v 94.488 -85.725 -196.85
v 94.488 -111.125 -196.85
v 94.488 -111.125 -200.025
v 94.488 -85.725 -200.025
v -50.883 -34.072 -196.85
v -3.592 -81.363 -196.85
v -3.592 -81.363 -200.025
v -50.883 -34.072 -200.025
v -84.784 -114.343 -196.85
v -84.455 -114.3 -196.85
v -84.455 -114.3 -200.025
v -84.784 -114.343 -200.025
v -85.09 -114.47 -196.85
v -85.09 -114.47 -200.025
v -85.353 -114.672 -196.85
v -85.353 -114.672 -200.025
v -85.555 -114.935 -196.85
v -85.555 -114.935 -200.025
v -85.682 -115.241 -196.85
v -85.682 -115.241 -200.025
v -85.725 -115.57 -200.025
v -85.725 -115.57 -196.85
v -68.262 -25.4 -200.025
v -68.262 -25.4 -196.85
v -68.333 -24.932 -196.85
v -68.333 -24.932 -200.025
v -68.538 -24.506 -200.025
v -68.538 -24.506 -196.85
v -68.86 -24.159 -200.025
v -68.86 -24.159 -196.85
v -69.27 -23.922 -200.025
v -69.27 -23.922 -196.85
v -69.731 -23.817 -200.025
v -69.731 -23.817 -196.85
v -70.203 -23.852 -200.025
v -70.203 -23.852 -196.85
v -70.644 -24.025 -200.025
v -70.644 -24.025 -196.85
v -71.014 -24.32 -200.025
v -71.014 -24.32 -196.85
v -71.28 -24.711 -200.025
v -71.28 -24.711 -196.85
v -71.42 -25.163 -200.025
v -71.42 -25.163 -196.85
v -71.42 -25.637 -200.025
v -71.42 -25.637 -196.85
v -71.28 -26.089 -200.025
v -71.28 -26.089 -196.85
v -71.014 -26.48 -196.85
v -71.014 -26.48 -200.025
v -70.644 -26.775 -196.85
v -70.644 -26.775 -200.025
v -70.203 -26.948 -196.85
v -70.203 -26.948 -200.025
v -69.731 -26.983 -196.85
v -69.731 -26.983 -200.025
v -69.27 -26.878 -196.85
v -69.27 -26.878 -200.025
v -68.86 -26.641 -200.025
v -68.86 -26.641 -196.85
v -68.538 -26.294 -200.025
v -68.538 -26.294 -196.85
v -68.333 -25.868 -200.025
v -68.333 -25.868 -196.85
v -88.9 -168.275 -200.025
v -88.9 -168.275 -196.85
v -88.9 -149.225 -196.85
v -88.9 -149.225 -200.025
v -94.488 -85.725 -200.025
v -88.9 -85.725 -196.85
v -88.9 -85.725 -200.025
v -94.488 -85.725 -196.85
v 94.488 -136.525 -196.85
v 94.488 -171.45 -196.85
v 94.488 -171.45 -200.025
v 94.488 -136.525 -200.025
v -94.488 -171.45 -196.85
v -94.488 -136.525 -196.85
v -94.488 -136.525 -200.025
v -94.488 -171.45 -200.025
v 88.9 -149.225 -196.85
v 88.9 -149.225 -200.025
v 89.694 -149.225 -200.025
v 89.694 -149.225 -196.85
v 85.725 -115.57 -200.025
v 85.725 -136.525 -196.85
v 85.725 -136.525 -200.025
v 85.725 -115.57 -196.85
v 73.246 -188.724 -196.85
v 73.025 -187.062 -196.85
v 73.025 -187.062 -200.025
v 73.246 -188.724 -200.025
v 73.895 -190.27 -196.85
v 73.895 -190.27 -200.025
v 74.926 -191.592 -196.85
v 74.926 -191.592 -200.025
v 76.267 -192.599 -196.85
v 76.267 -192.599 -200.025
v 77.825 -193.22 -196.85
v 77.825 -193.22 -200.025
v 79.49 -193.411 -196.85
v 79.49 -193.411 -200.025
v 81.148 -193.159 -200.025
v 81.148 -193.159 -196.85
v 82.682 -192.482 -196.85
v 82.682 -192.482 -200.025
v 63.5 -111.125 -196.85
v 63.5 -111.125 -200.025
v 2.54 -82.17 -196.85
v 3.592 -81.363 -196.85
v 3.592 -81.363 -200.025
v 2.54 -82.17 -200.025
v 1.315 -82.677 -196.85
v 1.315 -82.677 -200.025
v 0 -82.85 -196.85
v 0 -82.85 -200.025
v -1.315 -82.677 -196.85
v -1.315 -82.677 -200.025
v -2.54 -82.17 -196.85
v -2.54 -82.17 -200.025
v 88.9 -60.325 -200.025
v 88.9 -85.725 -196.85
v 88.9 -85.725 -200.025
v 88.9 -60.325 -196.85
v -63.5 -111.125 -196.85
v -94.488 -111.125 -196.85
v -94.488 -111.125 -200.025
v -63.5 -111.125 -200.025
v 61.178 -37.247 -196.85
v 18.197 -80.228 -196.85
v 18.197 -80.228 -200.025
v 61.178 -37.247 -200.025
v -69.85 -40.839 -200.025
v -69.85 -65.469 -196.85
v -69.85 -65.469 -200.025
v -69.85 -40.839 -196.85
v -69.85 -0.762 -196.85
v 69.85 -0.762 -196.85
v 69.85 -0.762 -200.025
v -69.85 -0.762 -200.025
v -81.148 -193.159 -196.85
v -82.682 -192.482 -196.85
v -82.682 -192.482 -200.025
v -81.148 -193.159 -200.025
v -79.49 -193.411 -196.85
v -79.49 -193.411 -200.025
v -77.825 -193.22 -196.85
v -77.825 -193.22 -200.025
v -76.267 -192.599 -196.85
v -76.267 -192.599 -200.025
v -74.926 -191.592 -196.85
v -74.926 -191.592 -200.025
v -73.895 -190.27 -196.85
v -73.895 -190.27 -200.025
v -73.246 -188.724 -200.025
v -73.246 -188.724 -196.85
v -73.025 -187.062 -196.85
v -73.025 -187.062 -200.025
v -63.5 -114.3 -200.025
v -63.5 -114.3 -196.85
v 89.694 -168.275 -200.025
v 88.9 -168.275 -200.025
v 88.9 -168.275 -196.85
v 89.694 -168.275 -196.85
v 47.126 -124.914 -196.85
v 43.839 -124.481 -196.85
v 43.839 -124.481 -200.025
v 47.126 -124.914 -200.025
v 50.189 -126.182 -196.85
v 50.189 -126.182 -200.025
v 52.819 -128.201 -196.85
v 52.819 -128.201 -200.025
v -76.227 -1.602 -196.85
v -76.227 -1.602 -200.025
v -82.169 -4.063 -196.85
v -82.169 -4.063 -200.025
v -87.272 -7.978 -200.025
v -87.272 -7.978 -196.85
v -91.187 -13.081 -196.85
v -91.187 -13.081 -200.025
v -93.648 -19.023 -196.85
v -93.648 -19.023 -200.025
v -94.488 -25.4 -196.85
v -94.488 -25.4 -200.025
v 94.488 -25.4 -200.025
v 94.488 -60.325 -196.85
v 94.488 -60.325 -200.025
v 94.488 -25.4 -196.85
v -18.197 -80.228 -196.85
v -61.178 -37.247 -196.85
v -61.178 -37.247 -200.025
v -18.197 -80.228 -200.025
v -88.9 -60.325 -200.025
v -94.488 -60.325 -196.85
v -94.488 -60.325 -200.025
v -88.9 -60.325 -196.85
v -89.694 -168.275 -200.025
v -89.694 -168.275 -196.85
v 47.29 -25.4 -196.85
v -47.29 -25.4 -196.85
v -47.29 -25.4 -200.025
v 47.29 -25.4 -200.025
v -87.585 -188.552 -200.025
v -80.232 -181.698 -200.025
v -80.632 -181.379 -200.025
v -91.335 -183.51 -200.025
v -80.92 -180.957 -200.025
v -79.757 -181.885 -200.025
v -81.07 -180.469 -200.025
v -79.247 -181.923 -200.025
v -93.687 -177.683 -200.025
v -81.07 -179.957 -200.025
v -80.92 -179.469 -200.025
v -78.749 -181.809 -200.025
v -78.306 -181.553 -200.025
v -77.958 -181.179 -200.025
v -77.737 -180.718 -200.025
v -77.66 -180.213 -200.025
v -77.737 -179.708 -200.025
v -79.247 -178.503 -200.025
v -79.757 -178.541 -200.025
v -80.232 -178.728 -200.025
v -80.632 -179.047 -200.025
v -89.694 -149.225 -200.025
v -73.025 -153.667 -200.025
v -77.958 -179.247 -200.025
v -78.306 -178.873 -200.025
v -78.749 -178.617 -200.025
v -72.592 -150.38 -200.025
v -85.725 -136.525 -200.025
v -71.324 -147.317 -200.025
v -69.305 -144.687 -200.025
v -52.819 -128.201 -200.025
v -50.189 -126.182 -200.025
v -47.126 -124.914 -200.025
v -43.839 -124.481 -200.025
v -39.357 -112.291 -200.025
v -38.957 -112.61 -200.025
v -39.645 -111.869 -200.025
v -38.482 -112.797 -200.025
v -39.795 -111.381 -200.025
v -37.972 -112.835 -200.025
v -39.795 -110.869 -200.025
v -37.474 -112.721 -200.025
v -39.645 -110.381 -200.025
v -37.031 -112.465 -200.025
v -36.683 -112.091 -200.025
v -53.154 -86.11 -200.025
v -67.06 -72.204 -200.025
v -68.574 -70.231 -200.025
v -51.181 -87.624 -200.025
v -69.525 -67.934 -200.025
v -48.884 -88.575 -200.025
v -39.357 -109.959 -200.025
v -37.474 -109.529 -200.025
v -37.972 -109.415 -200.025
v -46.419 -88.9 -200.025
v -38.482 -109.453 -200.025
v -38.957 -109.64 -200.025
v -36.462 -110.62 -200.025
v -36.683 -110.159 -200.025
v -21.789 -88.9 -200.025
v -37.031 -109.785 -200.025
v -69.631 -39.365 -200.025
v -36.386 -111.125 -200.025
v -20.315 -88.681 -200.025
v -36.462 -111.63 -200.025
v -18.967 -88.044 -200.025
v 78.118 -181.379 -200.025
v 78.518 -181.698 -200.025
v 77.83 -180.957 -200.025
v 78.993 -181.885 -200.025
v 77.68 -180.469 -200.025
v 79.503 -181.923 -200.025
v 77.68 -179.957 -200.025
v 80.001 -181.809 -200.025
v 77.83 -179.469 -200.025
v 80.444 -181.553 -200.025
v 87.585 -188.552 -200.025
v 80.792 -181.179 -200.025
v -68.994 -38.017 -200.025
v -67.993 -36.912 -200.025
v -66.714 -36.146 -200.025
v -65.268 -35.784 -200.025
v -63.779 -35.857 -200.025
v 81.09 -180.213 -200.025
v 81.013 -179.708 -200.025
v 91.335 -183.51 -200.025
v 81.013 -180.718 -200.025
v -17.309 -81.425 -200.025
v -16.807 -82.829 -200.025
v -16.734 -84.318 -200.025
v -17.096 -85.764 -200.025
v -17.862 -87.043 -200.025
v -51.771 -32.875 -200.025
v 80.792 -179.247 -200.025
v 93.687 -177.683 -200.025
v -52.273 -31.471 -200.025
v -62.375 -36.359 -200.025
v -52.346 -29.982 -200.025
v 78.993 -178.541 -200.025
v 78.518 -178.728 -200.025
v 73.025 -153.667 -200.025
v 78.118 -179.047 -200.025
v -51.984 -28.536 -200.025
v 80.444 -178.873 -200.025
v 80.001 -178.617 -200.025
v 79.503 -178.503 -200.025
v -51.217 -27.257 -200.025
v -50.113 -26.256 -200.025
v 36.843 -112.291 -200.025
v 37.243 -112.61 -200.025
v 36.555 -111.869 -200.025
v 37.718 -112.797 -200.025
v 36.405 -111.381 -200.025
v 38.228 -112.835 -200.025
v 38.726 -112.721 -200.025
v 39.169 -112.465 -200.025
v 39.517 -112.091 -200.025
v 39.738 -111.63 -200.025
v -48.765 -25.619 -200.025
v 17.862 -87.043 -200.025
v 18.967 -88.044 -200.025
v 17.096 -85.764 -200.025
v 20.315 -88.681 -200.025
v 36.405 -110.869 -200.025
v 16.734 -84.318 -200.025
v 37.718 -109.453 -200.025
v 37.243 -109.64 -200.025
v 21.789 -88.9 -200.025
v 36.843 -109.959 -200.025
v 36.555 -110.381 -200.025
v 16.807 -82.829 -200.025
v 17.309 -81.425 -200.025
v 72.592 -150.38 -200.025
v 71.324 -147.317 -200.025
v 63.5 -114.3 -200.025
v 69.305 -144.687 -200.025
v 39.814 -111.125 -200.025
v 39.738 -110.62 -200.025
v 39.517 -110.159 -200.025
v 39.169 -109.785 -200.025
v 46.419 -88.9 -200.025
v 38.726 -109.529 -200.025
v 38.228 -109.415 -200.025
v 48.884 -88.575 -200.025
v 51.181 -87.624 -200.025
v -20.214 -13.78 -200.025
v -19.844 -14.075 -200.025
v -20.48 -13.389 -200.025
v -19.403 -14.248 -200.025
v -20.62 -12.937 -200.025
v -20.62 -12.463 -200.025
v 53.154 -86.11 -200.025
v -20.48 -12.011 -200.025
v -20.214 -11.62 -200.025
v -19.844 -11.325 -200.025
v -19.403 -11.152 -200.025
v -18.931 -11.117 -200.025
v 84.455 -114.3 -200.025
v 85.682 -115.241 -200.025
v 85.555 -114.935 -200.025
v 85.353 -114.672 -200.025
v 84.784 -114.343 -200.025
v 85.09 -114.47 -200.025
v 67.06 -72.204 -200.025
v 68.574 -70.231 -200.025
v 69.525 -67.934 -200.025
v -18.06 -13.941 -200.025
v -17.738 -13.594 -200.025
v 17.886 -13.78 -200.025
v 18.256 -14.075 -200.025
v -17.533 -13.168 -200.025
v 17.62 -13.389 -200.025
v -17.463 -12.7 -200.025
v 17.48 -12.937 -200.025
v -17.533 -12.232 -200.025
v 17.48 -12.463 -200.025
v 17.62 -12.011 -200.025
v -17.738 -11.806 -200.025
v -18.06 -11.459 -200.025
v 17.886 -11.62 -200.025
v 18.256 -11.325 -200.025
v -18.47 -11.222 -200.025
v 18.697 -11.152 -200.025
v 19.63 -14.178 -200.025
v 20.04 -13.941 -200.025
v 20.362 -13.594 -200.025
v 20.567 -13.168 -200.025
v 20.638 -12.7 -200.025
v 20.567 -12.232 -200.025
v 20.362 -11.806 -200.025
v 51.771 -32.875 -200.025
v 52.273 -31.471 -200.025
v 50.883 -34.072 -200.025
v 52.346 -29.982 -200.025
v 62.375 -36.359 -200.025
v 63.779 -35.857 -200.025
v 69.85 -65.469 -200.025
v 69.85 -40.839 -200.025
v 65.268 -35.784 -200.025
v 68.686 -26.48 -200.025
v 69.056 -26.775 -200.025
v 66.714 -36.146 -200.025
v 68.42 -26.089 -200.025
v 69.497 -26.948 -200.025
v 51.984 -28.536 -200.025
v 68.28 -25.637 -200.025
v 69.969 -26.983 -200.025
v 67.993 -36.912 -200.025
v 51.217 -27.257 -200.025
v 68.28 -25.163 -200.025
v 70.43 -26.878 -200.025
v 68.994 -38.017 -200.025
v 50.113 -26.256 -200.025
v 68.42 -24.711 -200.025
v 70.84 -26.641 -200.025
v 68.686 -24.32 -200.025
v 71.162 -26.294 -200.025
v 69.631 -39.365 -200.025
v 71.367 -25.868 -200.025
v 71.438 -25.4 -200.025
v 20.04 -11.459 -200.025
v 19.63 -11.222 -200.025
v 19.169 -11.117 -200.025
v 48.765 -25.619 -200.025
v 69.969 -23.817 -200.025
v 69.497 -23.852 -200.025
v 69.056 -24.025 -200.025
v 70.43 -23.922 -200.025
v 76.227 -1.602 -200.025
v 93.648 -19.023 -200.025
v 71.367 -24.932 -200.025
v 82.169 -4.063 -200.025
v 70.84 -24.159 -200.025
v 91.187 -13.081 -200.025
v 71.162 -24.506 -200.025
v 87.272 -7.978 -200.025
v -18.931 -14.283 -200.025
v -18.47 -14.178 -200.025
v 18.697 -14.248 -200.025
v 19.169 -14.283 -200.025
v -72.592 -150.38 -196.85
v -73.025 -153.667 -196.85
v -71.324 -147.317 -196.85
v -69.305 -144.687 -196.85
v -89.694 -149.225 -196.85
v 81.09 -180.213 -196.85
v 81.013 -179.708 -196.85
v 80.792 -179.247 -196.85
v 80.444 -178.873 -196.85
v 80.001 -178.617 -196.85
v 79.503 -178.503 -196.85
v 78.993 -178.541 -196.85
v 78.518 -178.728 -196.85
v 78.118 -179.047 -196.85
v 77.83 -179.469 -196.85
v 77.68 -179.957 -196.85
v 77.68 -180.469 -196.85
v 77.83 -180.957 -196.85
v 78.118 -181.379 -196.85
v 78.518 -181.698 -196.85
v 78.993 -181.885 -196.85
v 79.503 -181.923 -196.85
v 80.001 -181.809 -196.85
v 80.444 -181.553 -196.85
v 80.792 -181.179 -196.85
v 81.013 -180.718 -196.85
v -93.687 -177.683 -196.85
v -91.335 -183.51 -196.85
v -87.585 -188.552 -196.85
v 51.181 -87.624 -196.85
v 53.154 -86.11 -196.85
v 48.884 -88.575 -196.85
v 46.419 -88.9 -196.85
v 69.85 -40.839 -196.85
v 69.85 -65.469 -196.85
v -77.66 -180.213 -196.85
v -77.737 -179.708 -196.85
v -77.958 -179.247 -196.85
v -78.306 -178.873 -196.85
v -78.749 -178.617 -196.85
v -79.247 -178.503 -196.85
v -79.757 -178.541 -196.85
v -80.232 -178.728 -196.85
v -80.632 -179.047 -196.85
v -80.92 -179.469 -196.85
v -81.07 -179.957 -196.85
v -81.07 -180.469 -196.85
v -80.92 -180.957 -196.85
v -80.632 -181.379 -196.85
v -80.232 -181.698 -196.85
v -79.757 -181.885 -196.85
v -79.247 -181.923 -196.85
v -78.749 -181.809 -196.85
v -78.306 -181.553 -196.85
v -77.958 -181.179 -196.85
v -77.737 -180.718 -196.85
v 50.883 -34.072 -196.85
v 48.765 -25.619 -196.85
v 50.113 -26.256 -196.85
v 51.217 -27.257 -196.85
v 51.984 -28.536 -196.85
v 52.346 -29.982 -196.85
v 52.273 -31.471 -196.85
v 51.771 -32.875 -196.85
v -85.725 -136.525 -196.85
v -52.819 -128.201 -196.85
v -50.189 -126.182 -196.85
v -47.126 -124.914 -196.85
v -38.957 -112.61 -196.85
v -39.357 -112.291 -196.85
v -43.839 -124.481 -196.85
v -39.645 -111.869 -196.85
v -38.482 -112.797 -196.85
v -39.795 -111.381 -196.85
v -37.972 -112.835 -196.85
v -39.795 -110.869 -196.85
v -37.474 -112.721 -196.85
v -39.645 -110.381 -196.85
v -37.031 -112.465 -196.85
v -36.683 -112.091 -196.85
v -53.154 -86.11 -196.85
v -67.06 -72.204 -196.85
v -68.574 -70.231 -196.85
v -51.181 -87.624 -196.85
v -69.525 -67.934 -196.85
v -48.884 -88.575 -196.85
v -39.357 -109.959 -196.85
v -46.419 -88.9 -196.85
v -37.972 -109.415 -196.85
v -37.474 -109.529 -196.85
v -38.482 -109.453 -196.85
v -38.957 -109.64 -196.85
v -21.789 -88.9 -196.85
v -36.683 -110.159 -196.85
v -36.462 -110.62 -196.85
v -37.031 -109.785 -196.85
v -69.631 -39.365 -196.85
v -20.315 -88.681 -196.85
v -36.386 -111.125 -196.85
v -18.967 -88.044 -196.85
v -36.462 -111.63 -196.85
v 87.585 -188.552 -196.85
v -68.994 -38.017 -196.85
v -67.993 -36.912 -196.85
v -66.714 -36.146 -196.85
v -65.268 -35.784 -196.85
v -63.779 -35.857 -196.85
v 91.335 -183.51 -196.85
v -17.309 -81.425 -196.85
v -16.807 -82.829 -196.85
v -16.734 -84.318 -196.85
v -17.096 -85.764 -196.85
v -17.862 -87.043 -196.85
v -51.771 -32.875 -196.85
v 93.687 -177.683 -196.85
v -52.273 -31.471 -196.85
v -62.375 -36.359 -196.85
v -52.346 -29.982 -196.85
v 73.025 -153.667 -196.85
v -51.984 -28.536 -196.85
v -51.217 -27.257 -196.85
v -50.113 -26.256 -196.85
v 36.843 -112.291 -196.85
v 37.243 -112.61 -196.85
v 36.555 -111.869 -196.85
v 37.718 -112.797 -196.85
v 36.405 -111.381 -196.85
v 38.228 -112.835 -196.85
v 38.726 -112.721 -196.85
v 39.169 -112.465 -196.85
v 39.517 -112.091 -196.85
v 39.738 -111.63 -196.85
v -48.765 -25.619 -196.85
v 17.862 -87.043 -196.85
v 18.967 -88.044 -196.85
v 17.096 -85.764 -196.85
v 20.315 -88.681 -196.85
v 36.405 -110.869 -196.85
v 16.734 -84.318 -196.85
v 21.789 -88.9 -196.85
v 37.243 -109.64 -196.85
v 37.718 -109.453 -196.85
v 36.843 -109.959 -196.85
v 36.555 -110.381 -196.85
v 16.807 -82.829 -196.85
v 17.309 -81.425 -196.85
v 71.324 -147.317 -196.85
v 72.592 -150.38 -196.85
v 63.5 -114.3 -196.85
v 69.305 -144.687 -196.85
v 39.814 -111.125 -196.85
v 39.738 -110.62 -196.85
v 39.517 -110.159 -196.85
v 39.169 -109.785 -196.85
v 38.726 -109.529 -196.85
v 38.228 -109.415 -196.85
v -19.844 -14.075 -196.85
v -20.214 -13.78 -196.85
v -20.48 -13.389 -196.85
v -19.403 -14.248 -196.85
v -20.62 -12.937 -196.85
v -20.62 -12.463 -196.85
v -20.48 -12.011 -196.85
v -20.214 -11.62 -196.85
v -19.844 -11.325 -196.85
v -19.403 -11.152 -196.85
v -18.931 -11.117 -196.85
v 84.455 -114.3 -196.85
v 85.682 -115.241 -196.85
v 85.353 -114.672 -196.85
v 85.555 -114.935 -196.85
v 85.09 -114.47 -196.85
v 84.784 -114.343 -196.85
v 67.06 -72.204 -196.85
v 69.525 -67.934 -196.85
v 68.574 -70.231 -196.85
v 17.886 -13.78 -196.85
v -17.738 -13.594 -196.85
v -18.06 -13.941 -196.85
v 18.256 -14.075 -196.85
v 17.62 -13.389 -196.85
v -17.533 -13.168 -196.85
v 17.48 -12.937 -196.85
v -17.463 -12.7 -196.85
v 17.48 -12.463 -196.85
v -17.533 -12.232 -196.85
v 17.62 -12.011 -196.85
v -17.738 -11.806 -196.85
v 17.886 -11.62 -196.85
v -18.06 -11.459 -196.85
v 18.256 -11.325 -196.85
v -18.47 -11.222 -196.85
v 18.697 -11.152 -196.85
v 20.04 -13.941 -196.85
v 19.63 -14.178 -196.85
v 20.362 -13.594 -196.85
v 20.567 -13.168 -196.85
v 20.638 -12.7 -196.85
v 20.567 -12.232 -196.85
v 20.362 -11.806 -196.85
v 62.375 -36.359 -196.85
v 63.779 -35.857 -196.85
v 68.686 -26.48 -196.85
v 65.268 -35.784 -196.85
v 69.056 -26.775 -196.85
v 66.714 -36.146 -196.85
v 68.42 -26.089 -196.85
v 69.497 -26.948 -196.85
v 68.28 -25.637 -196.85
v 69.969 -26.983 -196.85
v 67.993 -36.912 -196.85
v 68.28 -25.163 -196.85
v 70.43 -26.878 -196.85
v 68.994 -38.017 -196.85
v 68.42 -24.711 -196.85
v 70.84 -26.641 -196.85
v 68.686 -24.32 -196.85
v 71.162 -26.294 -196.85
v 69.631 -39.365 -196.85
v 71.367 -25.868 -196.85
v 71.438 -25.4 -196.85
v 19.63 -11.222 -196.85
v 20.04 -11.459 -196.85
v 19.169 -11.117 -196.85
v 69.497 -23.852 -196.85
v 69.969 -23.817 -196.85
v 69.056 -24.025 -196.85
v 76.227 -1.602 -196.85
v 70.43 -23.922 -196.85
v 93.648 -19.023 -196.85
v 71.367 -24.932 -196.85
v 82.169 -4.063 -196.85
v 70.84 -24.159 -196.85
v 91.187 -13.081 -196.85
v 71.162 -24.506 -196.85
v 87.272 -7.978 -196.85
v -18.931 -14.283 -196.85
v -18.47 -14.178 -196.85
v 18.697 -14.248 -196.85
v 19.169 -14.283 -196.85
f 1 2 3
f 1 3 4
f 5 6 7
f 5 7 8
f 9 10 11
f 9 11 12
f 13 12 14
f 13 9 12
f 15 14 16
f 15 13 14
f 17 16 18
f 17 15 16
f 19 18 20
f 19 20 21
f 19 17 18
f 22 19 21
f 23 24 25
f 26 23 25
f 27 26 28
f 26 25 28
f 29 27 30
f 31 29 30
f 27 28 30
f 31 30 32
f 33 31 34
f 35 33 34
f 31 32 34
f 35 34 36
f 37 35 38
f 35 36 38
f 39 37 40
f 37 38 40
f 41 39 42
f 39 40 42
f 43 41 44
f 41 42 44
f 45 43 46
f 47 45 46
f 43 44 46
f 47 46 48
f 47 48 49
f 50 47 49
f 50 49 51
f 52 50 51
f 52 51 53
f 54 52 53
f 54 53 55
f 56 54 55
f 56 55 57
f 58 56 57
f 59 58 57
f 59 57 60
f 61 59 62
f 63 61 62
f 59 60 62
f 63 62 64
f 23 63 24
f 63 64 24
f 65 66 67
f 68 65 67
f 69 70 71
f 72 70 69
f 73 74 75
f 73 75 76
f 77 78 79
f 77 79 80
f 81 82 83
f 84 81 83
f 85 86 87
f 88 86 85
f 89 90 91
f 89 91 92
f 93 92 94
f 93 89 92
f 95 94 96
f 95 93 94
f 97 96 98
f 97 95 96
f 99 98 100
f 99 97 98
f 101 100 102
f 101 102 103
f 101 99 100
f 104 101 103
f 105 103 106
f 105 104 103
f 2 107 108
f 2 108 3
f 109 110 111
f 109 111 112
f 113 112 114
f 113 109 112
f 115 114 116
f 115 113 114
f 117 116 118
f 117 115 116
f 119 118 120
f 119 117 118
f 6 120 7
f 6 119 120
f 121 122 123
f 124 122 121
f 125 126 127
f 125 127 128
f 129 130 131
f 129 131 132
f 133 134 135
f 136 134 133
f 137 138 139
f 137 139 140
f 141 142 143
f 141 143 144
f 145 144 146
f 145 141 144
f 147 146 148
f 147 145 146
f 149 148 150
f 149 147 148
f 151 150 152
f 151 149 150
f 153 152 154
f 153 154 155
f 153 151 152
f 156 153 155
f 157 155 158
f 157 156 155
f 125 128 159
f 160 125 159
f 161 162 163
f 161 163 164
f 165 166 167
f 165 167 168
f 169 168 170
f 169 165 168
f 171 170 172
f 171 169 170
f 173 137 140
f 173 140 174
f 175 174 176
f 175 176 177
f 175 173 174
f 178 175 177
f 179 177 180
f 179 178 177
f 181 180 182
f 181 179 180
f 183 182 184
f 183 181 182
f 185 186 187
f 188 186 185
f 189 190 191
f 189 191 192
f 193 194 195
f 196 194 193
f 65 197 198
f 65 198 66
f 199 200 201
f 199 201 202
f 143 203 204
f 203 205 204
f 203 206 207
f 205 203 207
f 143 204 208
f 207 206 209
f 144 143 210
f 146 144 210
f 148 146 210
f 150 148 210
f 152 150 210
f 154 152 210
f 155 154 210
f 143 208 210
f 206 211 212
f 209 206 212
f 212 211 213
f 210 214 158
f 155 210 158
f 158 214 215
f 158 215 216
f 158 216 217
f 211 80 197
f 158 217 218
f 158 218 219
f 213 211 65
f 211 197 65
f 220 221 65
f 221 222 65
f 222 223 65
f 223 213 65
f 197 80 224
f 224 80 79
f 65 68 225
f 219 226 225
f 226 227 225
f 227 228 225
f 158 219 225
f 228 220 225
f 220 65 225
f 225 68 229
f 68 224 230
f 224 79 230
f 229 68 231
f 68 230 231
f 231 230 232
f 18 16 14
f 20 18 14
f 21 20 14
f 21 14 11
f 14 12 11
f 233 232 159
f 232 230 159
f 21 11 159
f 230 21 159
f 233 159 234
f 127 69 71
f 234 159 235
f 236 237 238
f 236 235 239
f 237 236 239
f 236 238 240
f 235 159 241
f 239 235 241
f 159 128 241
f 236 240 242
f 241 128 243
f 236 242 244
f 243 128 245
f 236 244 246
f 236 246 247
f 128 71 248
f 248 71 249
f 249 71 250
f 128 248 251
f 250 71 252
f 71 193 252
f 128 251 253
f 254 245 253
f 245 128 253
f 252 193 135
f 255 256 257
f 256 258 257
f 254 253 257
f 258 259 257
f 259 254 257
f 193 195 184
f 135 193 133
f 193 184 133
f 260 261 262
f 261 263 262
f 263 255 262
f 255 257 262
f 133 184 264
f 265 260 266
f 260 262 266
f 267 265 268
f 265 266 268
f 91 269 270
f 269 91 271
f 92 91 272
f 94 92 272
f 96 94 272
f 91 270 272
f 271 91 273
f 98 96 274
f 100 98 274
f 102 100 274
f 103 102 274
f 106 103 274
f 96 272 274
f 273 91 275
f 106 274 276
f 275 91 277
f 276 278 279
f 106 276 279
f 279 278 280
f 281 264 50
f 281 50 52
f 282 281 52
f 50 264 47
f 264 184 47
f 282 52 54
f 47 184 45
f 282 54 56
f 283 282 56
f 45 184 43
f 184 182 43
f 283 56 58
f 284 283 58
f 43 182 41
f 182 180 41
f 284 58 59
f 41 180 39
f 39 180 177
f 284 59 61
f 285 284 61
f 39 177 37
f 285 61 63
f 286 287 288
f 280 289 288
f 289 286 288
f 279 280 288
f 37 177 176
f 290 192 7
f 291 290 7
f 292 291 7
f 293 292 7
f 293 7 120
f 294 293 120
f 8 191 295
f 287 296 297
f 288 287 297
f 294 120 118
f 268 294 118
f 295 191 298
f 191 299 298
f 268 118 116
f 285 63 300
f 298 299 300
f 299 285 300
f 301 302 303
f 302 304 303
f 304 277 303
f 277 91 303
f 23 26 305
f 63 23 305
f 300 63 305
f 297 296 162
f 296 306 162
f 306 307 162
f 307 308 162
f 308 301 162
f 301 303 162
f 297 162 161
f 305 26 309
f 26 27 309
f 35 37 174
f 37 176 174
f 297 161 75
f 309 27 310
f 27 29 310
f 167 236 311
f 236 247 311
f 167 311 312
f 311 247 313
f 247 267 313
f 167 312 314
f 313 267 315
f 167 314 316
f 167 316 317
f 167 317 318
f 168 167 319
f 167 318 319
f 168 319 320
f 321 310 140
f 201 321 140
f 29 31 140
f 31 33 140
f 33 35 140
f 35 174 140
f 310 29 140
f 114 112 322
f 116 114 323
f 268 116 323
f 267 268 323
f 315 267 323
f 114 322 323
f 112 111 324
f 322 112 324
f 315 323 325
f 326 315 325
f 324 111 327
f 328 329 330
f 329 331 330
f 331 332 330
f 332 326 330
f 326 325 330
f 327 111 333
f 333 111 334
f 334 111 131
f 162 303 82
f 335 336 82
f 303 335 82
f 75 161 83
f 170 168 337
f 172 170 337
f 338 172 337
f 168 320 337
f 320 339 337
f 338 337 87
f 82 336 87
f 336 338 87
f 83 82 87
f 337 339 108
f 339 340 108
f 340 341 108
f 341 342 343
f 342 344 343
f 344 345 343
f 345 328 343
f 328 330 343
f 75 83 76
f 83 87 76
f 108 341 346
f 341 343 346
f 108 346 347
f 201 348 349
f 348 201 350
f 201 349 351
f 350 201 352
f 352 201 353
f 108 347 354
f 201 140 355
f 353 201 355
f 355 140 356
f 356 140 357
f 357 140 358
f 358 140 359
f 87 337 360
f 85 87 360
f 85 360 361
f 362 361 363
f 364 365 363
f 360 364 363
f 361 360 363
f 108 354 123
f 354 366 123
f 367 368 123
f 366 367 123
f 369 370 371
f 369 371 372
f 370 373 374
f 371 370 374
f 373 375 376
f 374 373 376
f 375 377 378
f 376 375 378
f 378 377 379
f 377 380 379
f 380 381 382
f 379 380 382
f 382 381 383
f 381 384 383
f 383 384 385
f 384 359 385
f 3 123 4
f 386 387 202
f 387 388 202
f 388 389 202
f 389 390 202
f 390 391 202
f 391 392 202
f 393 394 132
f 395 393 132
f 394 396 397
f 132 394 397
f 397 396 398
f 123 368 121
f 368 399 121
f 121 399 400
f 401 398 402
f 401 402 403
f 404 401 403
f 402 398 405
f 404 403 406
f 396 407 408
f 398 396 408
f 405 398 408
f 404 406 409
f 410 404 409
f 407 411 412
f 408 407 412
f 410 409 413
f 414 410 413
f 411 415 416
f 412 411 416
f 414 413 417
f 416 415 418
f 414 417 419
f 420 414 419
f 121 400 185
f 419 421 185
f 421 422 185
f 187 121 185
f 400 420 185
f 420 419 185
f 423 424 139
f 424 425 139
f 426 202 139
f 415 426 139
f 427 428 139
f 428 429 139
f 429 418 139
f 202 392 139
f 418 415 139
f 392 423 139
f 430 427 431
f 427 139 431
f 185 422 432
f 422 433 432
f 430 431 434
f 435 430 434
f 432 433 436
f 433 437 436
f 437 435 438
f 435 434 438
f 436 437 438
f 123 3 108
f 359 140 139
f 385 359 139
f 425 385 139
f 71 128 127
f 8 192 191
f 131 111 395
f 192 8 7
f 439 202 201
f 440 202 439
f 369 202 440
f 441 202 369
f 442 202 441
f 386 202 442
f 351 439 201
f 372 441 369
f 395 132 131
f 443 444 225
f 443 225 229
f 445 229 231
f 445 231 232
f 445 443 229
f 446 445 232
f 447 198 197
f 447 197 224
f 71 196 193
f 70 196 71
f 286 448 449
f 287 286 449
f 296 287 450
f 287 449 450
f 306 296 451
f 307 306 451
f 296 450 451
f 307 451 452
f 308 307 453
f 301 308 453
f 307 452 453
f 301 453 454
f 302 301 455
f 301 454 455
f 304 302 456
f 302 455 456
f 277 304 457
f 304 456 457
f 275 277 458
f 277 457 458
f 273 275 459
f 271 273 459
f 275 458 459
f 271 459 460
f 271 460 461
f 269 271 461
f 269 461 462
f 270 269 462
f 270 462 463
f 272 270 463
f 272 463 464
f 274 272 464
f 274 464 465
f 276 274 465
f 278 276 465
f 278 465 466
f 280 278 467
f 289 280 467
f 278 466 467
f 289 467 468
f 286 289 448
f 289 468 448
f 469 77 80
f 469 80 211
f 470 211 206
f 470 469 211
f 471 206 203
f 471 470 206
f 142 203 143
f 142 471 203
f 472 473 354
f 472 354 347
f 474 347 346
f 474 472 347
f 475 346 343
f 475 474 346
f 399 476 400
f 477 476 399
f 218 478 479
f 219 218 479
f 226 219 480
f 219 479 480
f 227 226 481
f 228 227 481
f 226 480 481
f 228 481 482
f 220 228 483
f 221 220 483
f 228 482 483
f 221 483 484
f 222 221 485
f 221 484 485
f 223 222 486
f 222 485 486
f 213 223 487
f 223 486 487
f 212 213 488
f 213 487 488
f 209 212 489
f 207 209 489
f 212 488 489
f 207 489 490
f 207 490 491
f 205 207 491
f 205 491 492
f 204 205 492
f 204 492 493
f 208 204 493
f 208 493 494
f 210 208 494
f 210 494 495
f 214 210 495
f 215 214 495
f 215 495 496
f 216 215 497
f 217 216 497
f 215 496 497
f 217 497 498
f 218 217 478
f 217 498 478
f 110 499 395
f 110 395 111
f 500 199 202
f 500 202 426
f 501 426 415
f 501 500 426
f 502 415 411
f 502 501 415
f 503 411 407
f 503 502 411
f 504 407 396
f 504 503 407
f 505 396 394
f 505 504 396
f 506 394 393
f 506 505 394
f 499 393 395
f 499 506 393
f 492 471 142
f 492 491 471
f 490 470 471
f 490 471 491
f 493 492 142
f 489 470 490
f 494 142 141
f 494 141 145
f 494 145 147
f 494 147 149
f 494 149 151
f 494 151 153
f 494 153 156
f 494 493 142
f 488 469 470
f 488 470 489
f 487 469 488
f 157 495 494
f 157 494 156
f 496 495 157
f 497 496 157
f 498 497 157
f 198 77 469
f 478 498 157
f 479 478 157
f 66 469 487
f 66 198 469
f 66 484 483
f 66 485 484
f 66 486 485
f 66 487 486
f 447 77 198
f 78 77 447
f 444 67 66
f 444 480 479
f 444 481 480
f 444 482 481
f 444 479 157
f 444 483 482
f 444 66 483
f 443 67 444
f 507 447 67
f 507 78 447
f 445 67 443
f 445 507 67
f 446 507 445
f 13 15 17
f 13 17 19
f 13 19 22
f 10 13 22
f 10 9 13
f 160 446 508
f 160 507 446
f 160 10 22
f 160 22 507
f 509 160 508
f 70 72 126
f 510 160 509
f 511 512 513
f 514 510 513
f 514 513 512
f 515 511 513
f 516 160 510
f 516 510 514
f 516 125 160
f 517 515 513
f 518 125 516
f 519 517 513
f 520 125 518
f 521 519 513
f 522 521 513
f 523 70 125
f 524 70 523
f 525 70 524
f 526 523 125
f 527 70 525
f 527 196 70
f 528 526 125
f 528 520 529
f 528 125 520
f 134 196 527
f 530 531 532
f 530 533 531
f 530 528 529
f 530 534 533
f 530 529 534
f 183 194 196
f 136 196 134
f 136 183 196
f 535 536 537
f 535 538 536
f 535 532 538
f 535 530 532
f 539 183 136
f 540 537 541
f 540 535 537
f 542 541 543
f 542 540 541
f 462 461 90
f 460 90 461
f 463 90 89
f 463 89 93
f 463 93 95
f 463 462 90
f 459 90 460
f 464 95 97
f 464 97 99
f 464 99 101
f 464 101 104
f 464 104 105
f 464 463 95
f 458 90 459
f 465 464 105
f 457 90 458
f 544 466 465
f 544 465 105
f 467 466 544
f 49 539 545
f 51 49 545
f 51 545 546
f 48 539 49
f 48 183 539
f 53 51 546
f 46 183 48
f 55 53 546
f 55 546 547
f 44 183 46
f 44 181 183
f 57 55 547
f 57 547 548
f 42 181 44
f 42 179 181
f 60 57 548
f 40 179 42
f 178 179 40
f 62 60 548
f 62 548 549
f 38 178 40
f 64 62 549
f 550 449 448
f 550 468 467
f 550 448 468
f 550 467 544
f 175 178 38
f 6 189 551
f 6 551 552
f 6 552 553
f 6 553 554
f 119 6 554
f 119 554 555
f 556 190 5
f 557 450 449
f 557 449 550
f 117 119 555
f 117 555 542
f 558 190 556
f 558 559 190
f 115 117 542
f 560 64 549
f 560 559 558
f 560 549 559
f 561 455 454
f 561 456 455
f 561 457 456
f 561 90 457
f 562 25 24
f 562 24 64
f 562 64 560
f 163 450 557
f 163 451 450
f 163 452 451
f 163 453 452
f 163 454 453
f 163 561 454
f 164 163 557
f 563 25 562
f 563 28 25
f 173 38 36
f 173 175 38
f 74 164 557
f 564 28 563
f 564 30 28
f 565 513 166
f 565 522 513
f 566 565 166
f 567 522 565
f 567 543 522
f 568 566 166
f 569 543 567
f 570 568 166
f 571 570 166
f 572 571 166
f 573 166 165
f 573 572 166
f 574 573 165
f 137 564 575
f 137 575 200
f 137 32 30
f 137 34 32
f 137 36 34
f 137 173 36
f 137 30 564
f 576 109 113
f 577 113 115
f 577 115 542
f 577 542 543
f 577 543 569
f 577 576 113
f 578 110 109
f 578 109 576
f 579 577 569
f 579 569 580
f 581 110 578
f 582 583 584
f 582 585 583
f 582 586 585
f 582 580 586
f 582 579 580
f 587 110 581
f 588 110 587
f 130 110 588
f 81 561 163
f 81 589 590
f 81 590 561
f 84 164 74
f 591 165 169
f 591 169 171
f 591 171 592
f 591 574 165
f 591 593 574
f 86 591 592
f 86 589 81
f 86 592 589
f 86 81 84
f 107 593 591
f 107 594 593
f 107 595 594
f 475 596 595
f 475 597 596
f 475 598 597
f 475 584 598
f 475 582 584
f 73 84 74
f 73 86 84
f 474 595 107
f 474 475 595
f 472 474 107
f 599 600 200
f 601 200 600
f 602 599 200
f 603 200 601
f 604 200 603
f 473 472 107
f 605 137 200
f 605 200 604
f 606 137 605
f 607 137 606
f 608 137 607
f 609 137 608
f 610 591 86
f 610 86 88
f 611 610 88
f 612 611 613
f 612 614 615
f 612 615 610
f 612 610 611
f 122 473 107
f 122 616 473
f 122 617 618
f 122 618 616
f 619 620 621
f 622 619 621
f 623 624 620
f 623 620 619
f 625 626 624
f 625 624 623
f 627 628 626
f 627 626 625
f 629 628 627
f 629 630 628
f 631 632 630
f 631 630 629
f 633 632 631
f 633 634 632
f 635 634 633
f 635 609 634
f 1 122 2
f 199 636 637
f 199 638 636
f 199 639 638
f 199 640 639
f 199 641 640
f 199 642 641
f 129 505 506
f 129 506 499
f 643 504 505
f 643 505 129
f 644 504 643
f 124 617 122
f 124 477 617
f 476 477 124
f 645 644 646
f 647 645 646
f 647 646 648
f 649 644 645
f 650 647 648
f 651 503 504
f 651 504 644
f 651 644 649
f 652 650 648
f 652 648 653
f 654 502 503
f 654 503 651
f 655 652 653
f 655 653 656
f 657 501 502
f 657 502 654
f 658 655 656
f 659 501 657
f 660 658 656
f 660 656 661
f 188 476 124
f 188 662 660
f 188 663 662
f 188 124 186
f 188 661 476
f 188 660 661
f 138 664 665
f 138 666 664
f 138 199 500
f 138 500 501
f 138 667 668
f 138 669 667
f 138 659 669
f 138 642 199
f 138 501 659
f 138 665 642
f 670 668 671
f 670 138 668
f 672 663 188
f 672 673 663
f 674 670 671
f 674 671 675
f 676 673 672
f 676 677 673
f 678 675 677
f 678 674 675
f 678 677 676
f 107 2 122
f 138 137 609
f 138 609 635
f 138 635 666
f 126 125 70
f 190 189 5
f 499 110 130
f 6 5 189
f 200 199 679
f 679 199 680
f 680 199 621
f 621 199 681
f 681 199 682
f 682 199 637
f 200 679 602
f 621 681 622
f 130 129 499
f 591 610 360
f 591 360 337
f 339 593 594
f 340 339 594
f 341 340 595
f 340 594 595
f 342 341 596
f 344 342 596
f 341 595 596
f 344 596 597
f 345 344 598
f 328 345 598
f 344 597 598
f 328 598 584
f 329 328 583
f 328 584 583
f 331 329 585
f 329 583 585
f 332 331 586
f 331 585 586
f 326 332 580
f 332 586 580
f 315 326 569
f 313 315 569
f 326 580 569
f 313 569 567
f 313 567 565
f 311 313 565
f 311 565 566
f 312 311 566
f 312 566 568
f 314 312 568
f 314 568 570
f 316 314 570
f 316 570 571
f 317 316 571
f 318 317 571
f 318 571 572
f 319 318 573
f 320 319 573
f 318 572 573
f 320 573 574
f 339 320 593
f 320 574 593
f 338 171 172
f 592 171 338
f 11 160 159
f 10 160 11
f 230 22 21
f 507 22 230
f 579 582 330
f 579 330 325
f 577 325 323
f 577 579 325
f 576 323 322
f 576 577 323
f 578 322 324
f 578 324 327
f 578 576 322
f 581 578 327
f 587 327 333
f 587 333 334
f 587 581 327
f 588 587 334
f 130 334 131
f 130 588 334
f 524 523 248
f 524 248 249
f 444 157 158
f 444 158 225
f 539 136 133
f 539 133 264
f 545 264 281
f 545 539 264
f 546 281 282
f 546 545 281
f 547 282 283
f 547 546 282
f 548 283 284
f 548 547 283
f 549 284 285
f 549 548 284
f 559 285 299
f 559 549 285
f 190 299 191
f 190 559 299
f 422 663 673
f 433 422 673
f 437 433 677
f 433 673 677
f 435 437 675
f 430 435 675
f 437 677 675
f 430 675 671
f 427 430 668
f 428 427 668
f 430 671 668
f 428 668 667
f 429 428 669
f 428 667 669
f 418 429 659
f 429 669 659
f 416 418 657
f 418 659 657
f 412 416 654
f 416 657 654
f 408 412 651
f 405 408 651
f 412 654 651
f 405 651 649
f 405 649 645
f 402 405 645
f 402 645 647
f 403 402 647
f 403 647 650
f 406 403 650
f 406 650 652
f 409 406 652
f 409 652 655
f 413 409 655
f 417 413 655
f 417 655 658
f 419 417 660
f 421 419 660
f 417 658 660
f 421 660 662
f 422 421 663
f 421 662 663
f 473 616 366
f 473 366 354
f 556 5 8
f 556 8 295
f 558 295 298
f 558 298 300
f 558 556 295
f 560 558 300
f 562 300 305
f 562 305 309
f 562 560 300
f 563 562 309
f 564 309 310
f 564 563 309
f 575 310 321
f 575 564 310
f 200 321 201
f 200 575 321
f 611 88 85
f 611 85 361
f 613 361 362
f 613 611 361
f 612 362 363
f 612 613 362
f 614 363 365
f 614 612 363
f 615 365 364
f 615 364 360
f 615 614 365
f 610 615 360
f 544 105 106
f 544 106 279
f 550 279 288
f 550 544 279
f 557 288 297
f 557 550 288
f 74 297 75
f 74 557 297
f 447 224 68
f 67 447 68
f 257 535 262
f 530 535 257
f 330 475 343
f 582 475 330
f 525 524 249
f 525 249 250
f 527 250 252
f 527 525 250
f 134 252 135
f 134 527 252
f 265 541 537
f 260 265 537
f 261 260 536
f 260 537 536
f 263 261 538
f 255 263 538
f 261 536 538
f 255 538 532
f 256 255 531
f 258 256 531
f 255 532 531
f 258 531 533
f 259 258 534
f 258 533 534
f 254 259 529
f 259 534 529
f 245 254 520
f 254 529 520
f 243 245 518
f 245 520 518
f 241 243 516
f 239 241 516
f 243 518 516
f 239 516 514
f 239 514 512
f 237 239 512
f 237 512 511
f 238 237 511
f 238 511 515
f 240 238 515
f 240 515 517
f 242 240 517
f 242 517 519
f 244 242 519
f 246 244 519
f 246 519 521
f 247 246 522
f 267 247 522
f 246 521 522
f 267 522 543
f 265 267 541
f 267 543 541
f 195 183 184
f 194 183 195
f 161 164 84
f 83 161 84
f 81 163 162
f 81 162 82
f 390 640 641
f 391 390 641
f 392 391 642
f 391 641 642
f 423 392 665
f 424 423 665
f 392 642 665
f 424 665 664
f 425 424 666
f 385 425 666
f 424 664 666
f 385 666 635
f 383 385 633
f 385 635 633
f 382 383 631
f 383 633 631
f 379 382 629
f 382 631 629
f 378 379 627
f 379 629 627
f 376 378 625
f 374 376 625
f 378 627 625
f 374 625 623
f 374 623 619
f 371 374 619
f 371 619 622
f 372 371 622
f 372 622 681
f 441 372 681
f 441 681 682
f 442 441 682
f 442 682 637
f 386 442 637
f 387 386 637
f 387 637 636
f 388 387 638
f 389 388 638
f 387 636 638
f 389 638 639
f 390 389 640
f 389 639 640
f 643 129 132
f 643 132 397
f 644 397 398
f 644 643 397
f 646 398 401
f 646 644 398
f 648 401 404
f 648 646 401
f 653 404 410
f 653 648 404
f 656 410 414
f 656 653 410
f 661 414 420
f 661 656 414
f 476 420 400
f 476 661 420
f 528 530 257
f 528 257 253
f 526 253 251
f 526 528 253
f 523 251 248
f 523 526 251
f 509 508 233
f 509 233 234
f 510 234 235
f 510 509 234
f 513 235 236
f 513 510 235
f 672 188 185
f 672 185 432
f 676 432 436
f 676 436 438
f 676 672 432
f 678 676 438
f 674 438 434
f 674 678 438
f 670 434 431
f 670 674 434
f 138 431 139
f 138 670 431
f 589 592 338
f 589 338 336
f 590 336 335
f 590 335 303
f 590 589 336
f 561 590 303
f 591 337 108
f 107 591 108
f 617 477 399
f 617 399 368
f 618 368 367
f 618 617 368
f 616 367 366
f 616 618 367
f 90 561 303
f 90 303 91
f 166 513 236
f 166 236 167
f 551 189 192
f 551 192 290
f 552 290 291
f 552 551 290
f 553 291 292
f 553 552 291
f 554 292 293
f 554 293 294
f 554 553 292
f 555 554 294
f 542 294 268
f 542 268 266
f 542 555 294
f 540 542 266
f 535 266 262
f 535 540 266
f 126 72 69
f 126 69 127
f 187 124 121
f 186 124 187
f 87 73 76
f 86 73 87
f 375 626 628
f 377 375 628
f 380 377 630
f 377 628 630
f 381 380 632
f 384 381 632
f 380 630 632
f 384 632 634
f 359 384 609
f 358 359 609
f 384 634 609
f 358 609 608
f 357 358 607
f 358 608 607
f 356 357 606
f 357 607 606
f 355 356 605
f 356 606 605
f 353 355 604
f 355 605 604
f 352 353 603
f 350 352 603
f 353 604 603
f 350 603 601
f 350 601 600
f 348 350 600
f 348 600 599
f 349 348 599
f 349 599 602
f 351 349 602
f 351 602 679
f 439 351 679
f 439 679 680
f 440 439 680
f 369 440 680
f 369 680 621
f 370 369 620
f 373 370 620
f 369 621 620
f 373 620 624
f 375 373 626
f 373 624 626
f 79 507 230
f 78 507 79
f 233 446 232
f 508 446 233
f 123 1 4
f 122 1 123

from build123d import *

# Parameters (mm, degrees)
SKETCH1_R           = 1.7145
SKETCH1_W           = 0.79375
SKETCH1_H           = 19.05
SKETCH1_R_2         = 1.5875
BOSS_EXTRUDE1_DEPTH = 3.175


with BuildPart() as part:
    # Sketch1 → Boss-Extrude1 (new body)
    with BuildSketch(Plane.XY.offset(-196.85)):
        with BuildLine():
            Line((-85.725, -136.525), (-94.488, -136.525))
            Line((-94.488, -136.525), (-94.488, -171.45))
            ThreePointArc((-94.488, -171.45), (-91.334797487, -183.509623583), (-82.682291667, -192.482435298))
            ThreePointArc((-82.682291667, -192.482435298), (-76.266849592, -192.599023491), (-73.025, -187.061704551))
            Line((-73.025, -187.061704551), (-73.025, -153.666835653))
            ThreePointArc((-73.025, -153.666835653), (-72.058270063, -148.806756062), (-69.305256121, -144.686579532))
            Line((-69.305256121, -144.686579532), (-52.819423728, -128.200747139))
            ThreePointArc((-52.819423728, -128.200747139), (-48.699247198, -125.447733197), (-43.839167607, -124.48100326))
            Line((-43.839167607, -124.48100326), (43.839167607, -124.48100326))
            ThreePointArc((43.839167607, -124.48100326), (48.699247198, -125.447733197), (52.819423728, -128.200747139))
            Line((52.819423728, -128.200747139), (69.305256121, -144.686579532))
            ThreePointArc((69.305256121, -144.686579532), (72.058270063, -148.806756062), (73.025, -153.666835653))
            Line((73.025, -153.666835653), (73.025, -187.061704551))
            ThreePointArc((73.025, -187.061704551), (76.266849592, -192.599023491), (82.682291667, -192.482435298))
            ThreePointArc((82.682291667, -192.482435298), (91.334797487, -183.509623583), (94.488, -171.45))
            Line((94.488, -171.45), (94.488, -136.525))
            Line((94.488, -136.525), (85.725, -136.525))
            Line((85.725, -136.525), (85.725, -115.57))
            ThreePointArc((85.725, -115.57), (85.353025612, -114.671974388), (84.455, -114.3))
            Line((84.455, -114.3), (63.5, -114.3))
            Line((63.5, -114.3), (63.5, -111.125))
            Line((63.5, -111.125), (94.488, -111.125))
            Line((94.488, -111.125), (94.488, -85.725))
            Line((94.488, -85.725), (88.9, -85.725))
            Line((88.9, -85.725), (88.9, -60.325))
            Line((88.9, -60.325), (94.488, -60.325))
            Line((94.488, -60.325), (94.488, -25.4))
            ThreePointArc((94.488, -25.4), (87.271696875, -7.978303125), (69.85, -0.762))
            Line((69.85, -0.762), (-69.85, -0.762))
            ThreePointArc((-69.85, -0.762), (-87.271696875, -7.978303125), (-94.488, -25.4))
            Line((-94.488, -25.4), (-94.488, -60.325))
            Line((-94.488, -60.325), (-88.9, -60.325))
            Line((-88.9, -60.325), (-88.9, -85.725))
            Line((-88.9, -85.725), (-94.488, -85.725))
            Line((-94.488, -85.725), (-94.488, -111.125))
            Line((-94.488, -111.125), (-63.5, -111.125))
            Line((-63.5, -111.125), (-63.5, -114.3))
            Line((-63.5, -114.3), (-84.455, -114.3))
            ThreePointArc((-84.455, -114.3), (-85.353025612, -114.671974388), (-85.725, -115.57))
            Line((-85.725, -115.57), (-85.725, -136.525))
        make_face()
        with Locations((-79.375, -180.213)):
            Circle(SKETCH1_R, mode=Mode.SUBTRACT)
        with Locations((-89.296875, -158.75)):
            Rectangle(SKETCH1_W, SKETCH1_H, mode=Mode.SUBTRACT)
        with Locations((-38.1, -111.125)):
            Circle(SKETCH1_R, mode=Mode.SUBTRACT)
        with Locations((79.375, -180.213)):
            Circle(SKETCH1_R, mode=Mode.SUBTRACT)
        with Locations((89.296875, -158.75)):
            Rectangle(SKETCH1_W, SKETCH1_H, mode=Mode.SUBTRACT)
        with Locations((38.1, -111.125)):
            Circle(SKETCH1_R, mode=Mode.SUBTRACT)
        with BuildLine():
            ThreePointArc((-67.060192091, -72.204012806), (-69.124952547, -69.113880409), (-69.85, -65.468820715))
            Line((-69.85, -65.468820715), (-69.85, -40.839204897))
            ThreePointArc((-69.85, -40.839204897), (-66.714031836, -36.145896872), (-61.177897552, -37.247102448))
            Line((-61.177897552, -37.247102448), (-18.197102448, -80.227897552))
            ThreePointArc((-18.197102448, -80.227897552), (-17.095896872, -85.764031836), (-21.789204897, -88.9))
            Line((-21.789204897, -88.9), (-46.418820715, -88.9))
            ThreePointArc((-46.418820715, -88.9), (-50.063880409, -88.174952547), (-53.154012806, -86.110192091))
            Line((-53.154012806, -86.110192091), (-67.060192091, -72.204012806))
        make_face(mode=Mode.SUBTRACT)
        with Locations((-69.85, -25.4)):
            Circle(SKETCH1_R_2, mode=Mode.SUBTRACT)
        with Locations((-19.05, -12.7)):
            Circle(SKETCH1_R_2, mode=Mode.SUBTRACT)
        with BuildLine():
            ThreePointArc((3.592102448, -81.36251337), (0, -82.850410922), (-3.592102448, -81.36251337))
            Line((-3.592102448, -81.36251337), (-50.88251337, -34.072102448))
            ThreePointArc((-50.88251337, -34.072102448), (-51.983718947, -28.535968164), (-47.290410922, -25.4))
            Line((-47.290410922, -25.4), (47.290410922, -25.4))
            ThreePointArc((47.290410922, -25.4), (51.983718947, -28.535968164), (50.88251337, -34.072102448))
            Line((50.88251337, -34.072102448), (3.592102448, -81.36251337))
        make_face(mode=Mode.SUBTRACT)
        with BuildLine():
            ThreePointArc((53.154012806, -86.110192091), (50.063880409, -88.174952547), (46.418820715, -88.9))
            Line((46.418820715, -88.9), (21.789204897, -88.9))
            ThreePointArc((21.789204897, -88.9), (17.095896872, -85.764031836), (18.197102448, -80.227897552))
            Line((18.197102448, -80.227897552), (61.177897552, -37.247102448))
            ThreePointArc((61.177897552, -37.247102448), (66.714031836, -36.145896872), (69.85, -40.839204897))
            Line((69.85, -40.839204897), (69.85, -65.468820715))
            ThreePointArc((69.85, -65.468820715), (69.124952547, -69.113880409), (67.060192091, -72.204012806))
            Line((67.060192091, -72.204012806), (53.154012806, -86.110192091))
        make_face(mode=Mode.SUBTRACT)
        with Locations((19.05, -12.7)):
            Circle(SKETCH1_R_2, mode=Mode.SUBTRACT)
        with Locations((69.85, -25.4)):
            Circle(SKETCH1_R_2, mode=Mode.SUBTRACT)
    extrude(amount=-BOSS_EXTRUDE1_DEPTH)


solid = part.part
